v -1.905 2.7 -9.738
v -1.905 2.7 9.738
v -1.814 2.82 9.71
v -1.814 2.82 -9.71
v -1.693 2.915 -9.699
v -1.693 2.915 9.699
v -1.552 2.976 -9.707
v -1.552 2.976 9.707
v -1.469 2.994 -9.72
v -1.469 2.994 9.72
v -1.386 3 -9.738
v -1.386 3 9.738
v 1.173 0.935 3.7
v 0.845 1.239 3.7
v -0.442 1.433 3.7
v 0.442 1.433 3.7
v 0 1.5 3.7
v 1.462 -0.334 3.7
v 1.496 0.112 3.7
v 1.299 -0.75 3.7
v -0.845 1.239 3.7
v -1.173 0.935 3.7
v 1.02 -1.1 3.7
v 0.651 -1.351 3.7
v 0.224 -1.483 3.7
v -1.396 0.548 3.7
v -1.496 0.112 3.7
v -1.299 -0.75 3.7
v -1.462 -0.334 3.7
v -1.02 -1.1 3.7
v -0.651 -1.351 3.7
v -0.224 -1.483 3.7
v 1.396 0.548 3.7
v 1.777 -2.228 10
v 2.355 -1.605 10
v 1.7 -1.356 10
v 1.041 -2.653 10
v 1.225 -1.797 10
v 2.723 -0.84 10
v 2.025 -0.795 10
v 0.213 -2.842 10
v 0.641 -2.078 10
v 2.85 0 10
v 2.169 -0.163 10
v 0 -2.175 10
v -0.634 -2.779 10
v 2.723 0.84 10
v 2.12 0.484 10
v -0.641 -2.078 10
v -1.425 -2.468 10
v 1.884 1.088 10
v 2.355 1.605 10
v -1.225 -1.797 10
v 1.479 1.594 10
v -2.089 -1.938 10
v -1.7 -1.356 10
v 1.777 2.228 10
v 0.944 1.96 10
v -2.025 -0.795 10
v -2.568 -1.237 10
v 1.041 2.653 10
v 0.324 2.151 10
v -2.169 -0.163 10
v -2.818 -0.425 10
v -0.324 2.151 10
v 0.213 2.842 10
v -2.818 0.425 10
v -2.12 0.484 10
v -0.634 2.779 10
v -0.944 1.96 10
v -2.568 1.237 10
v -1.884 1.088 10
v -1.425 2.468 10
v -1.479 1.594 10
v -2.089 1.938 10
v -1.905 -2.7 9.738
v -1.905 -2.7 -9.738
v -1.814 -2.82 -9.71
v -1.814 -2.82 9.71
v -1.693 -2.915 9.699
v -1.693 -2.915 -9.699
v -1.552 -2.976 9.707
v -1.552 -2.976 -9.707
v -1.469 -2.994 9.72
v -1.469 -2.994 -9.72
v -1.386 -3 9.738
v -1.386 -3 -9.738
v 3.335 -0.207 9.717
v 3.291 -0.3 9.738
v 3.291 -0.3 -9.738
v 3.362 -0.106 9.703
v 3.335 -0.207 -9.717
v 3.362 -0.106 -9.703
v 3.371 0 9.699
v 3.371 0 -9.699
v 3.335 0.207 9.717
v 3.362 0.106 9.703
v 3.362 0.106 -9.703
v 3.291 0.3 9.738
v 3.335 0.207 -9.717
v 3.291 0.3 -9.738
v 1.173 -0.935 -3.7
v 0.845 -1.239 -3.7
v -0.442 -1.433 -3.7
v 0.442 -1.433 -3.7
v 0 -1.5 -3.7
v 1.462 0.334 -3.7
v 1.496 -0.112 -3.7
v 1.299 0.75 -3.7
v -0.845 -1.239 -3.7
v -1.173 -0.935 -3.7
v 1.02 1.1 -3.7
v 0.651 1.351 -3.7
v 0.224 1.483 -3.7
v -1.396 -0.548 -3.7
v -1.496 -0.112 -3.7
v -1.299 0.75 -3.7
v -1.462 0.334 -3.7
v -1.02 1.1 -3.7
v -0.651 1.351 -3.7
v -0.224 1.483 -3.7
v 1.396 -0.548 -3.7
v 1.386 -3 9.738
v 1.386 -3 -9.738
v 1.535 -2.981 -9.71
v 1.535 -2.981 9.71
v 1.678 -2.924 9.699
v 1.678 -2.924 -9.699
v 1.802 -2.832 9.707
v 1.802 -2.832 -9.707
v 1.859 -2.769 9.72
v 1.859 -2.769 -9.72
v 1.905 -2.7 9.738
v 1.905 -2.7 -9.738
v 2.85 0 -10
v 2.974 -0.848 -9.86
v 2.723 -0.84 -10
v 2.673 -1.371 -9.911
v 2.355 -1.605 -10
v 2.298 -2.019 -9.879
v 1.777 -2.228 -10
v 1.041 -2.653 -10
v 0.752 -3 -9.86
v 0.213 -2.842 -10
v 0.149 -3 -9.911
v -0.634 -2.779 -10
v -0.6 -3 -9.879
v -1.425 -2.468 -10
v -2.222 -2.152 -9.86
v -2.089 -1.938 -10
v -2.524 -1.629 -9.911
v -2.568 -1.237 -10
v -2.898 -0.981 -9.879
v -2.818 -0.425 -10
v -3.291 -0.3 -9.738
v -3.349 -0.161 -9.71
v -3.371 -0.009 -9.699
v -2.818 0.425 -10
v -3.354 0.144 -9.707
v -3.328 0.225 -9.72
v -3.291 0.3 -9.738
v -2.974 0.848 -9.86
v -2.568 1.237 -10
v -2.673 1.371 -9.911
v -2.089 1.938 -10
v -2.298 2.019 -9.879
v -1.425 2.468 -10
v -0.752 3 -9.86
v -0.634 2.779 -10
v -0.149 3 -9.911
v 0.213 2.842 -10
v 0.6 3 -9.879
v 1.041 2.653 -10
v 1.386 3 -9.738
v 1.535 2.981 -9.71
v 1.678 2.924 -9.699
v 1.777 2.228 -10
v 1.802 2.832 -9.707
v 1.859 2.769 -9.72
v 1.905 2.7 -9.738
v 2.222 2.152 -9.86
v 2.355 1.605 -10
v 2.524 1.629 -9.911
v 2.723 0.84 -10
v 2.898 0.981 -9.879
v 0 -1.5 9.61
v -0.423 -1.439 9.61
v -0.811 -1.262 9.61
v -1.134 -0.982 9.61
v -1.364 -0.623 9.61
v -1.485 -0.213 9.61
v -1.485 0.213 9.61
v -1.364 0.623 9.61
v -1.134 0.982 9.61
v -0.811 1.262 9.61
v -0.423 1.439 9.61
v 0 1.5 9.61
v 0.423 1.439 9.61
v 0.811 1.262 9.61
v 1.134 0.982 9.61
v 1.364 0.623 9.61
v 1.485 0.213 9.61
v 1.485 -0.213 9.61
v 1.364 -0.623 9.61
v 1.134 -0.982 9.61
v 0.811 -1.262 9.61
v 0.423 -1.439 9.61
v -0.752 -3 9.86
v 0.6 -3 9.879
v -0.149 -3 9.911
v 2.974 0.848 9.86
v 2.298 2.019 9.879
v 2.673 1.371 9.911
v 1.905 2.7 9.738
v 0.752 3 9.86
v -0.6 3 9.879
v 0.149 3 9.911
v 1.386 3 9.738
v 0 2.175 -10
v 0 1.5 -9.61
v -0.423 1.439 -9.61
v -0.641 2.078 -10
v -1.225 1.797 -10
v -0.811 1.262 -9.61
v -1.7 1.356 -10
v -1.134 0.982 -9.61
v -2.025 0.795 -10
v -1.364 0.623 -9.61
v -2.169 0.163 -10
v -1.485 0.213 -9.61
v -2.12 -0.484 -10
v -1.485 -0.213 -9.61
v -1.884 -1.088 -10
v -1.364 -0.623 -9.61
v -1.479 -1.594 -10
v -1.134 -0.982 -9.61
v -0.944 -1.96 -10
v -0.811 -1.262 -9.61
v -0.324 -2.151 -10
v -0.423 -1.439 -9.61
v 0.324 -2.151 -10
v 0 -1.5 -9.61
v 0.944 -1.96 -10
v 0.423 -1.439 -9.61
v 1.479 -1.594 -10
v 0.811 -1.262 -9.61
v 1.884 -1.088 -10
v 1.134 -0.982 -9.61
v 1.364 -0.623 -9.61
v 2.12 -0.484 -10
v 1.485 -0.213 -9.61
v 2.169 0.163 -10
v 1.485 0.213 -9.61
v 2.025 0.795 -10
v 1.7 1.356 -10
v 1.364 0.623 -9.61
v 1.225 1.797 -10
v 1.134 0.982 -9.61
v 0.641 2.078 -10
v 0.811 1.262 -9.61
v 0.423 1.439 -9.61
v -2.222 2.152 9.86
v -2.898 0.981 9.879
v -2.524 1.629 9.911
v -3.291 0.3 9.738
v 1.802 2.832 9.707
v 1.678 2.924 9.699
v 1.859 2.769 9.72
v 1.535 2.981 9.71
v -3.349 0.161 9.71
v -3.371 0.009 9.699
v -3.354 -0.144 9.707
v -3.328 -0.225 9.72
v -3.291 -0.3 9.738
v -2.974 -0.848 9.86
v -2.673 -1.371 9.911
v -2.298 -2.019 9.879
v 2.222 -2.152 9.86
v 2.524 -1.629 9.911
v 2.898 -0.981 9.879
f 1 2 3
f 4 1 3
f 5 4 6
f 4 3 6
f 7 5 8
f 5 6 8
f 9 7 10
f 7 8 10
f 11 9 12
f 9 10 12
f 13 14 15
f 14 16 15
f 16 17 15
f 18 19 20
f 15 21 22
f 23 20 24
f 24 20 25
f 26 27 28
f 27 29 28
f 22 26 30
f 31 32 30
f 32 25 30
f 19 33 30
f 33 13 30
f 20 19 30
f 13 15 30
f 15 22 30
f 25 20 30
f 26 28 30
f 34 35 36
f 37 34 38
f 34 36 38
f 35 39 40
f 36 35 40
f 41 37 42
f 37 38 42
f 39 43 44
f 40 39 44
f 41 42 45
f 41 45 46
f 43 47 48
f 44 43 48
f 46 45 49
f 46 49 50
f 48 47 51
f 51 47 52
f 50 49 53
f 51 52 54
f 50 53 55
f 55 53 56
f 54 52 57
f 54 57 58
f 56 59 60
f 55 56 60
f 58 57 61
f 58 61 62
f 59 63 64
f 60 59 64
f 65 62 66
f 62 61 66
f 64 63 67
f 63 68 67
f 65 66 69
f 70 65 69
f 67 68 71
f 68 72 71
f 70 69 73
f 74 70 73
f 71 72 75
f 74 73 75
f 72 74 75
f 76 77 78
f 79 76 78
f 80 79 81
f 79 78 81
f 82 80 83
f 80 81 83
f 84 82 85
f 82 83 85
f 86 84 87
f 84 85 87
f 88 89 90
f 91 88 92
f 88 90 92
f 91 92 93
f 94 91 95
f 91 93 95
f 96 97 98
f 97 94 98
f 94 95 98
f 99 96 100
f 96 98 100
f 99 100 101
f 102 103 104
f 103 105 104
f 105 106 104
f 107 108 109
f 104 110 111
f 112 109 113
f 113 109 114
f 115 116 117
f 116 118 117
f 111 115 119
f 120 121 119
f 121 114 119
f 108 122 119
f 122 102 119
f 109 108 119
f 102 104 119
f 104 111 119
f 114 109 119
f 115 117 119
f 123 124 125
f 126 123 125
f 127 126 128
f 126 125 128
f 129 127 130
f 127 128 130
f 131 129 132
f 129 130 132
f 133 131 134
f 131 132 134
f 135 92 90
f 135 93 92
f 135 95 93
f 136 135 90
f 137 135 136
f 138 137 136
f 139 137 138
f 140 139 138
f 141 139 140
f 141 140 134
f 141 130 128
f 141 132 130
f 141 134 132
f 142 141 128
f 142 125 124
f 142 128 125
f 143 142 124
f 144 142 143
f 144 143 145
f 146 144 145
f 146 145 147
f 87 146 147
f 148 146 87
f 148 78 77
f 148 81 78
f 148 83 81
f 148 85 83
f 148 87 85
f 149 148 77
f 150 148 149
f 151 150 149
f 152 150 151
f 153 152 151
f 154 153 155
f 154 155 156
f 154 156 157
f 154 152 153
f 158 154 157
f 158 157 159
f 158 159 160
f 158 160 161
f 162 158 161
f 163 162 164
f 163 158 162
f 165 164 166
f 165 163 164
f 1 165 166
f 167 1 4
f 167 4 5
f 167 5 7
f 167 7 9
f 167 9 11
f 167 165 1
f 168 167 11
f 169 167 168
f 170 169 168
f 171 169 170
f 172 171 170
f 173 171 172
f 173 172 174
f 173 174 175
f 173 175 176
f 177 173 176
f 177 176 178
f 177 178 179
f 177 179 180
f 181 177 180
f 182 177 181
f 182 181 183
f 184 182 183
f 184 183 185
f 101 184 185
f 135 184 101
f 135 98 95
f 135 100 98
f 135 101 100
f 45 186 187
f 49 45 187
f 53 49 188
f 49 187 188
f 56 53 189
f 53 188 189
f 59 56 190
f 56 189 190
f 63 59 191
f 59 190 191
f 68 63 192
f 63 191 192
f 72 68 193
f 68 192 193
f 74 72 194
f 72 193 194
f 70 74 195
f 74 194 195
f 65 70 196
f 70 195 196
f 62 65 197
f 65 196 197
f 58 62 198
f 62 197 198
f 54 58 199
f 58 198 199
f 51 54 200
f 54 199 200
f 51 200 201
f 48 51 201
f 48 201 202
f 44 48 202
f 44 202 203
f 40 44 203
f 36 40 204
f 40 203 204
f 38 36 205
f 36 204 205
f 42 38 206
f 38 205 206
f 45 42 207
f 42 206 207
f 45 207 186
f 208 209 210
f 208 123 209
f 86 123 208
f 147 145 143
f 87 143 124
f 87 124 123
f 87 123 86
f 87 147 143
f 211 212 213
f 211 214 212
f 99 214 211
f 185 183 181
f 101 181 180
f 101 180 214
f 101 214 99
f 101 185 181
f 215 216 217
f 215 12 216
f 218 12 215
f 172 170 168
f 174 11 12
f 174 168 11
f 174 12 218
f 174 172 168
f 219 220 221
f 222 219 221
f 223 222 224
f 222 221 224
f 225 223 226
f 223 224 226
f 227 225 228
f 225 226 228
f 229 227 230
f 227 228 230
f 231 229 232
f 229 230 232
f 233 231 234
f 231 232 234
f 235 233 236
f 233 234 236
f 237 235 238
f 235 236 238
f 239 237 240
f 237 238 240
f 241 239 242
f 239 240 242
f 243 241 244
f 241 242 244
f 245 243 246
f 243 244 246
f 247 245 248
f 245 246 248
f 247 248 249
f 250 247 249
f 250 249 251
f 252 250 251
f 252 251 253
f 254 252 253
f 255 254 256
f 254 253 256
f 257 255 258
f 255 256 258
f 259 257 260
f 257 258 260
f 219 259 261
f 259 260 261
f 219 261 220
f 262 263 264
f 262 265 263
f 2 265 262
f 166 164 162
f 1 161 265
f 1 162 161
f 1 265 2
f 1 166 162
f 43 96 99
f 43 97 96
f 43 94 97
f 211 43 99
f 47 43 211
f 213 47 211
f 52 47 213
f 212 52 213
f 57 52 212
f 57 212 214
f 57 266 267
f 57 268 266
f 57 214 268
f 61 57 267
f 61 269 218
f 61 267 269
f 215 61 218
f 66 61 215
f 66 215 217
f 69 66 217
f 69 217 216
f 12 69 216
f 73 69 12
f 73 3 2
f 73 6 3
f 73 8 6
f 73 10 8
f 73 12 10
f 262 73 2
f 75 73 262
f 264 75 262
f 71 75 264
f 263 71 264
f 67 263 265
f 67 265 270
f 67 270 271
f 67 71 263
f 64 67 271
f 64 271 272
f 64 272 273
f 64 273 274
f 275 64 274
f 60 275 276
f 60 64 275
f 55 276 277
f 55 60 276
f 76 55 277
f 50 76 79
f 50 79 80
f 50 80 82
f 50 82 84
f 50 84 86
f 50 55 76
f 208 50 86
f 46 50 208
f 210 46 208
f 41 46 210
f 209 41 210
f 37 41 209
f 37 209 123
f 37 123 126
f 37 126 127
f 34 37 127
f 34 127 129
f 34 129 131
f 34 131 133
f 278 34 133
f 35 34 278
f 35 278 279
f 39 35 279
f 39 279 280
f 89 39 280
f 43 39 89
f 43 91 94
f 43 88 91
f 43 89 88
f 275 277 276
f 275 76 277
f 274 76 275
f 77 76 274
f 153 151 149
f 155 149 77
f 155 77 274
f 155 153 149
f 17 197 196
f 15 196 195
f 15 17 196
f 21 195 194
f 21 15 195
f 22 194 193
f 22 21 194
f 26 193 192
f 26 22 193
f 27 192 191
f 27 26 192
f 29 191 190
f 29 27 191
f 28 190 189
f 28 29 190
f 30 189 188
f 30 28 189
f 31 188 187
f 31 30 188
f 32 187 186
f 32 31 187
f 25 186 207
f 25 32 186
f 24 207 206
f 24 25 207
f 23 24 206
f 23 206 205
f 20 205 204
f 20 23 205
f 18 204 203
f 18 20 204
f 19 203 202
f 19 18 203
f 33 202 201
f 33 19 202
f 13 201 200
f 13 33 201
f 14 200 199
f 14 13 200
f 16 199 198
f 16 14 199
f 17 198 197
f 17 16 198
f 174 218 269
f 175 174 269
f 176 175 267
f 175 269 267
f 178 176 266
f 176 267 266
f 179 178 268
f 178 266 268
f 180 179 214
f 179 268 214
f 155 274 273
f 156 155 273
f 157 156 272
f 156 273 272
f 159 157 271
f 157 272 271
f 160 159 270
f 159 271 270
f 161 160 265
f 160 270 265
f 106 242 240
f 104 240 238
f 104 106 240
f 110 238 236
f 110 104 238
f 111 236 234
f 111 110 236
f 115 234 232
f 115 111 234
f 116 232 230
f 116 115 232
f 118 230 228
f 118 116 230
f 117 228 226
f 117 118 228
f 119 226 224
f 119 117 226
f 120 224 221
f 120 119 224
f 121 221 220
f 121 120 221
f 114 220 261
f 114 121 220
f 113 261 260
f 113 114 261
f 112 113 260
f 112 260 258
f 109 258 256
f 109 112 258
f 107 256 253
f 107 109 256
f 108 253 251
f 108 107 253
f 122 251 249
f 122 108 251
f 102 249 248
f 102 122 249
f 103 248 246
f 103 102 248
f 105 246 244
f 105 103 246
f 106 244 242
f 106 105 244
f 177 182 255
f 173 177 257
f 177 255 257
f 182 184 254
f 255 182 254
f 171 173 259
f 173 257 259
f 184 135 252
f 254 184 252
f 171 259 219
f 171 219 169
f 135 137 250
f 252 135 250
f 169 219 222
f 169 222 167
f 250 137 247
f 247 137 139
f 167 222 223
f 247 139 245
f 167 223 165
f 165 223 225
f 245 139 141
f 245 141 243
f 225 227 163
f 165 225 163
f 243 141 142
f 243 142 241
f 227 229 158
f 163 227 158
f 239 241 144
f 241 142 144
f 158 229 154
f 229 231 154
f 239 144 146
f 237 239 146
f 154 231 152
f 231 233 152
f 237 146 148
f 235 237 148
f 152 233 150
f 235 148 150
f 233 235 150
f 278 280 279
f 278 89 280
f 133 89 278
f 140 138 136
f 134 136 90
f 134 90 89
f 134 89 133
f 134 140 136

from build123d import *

# Parameters (mm, degrees)
SKETCH4_R           = 2.25
BOSS_EXTRUDE1_DEPTH = 10
SKETCH5_OUTSIDE_W   = 87.87
SKETCH5_OUTSIDE_H   = 86.942
SKETCH5_OUTSIDE_R   = 2.85
CUT_EXTRUDE1_DEPTH  = 21.518284529
CUT_EXTRUDE1_DRAFT  = -60
SKETCH6_OUTSIDE_W   = 87.87
SKETCH6_OUTSIDE_H   = 86.942
SKETCH6_OUTSIDE_R   = 2.85
CUT_EXTRUDE2_DEPTH  = 21.518284529
CUT_EXTRUDE2_DRAFT  = -60
FILLET1_R           = 0.6
BOSS_EXTRUDE2_START = -10
SKETCH7_R           = 2.175
BOSS_EXTRUDE2_DEPTH = 6.3
SKETCH8_W           = 6.3
SKETCH8_H           = 1.5
CIRPATTERN1_COUNT   = 2


with BuildPart() as part:
    # Sketch3 → Revolve1 (revolve)
    with BuildSketch(Plane(origin=(0, 0, 0), x_dir=(0, 0, -1), z_dir=(1, 0, 0))):
        Polygon((-9.610288568, 1.5), (-3.7, 1.5), (-3.7, 0), (3.7, 0), (3.7, 1.5), (9.610288568, 1.5), (10, 2.175), (10, 3), (0, 3), (-10, 3), (-10, 2.175), align=None)
        Polygon((-9.610288568, 1.5), (-3.7, 1.5), (-3.7, 0), (3.7, 0), (3.7, 1.5), (9.610288568, 1.5), (10, 2.175), (10, 3), (0, 3), (-10, 3), (-10, 2.175), align=None)
    revolve(axis=Axis((0, 0, 3.7), (0, 0, 1)))

    # Sketch4 → Boss-Extrude1 (add, symmetric)
    with BuildSketch(Plane.XY):
        Polygon((-1.732050808, 3), (-3.464101615, 0), (-1.732050808, -3), (1.732050808, -3), (3.464101615, 0), (1.732050808, 3), align=None)
        Circle(SKETCH4_R, mode=Mode.SUBTRACT)
    extrude(amount=BOSS_EXTRUDE1_DEPTH, both=True)


with BuildPart() as cut_extrude1_tool:
    # Sketch5 outside → Cut-Extrude1 (with draft: the straight prism first)
    with BuildSketch(Plane.XY.offset(10)):
        Rectangle(SKETCH5_OUTSIDE_W, SKETCH5_OUTSIDE_H)
        Circle(SKETCH5_OUTSIDE_R, mode=Mode.SUBTRACT)
    extrude(amount=-CUT_EXTRUDE1_DEPTH)
    # Cut-Extrude1: the draft: its side faces are tilted about the plane it starts from
    cut_extrude1_sides = [cut_extrude1_tool.faces().sort_by_distance(p)[0] for p in [
        (0, -43.471, -0.759142264),
        (43.935, 0, -0.759142264),
        (0, 43.471, -0.759142264),
        (-43.935, 0, -0.759142264),
        (-2.85, 0, -0.759142264),
    ]]
    draft(cut_extrude1_sides, Plane.XY.offset(10), CUT_EXTRUDE1_DRAFT)


with BuildPart() as part_1:
    add(part.part)

    # Cut-Extrude1: cut by cut_extrude1_tool
    add(cut_extrude1_tool.part, mode=Mode.SUBTRACT)


with BuildPart() as cut_extrude2_tool:
    # Sketch6 outside → Cut-Extrude2 (with draft: the straight prism first)
    with BuildSketch(Plane(origin=(0, 0, -10), x_dir=(-1, 0, 0), z_dir=(0, 0, -1))):
        Rectangle(SKETCH6_OUTSIDE_W, SKETCH6_OUTSIDE_H)
        Circle(SKETCH6_OUTSIDE_R, mode=Mode.SUBTRACT)
    extrude(amount=-CUT_EXTRUDE2_DEPTH)
    # Cut-Extrude2: the draft: its side faces are tilted about the plane it starts from
    cut_extrude2_sides = [cut_extrude2_tool.faces().sort_by_distance(p)[0] for p in [
        (0, -43.471, 0.759142264),
        (-43.935, 0, 0.759142264),
        (0, 43.471, 0.759142264),
        (43.935, 0, 0.759142264),
        (2.85, 0, 0.759142264),
    ]]
    draft(cut_extrude2_sides, Plane(origin=(0, 0, -10), x_dir=(-1, 0, 0), z_dir=(0, 0, -1)), CUT_EXTRUDE2_DRAFT)


with BuildPart() as part_2:
    add(part_1.part)

    # Cut-Extrude2: cut by cut_extrude2_tool
    add(cut_extrude2_tool.part, mode=Mode.SUBTRACT)

    # Fillet1
    # the kernel refuses this fillet: 0.6 mm, written as the material it takes off along each edge
    with BuildSketch(Plane(origin=(1.732050808, 3, 10.511473671), x_dir=(-1, 0, 0), z_dir=(0, 0, -1)), Plane(origin=(-1.732050808, 3, 10.511473671), x_dir=(-0.5000000000000006, -0.8660254037844383, 0), z_dir=(0, 0, -1))) as fillet1_piece_1:
        with BuildLine():
            CenterArc((FILLET1_R * 0.57735026919, -FILLET1_R), FILLET1_R, 90, 60)
            Line((-FILLET1_R * 0.288675134595, -FILLET1_R * 0.5), (0, 0))
            Line((0, 0), (FILLET1_R * 0.57735026919, 0))
        make_face()
    extrude(amount=21.022947342, mode=Mode.SUBTRACT)
    with BuildSketch(Plane(origin=(-3.464101615, 0, -10.511473671), x_dir=(0.5000000000000008, -0.8660254037844383, 0), z_dir=(0, 0, 1)), Plane(origin=(-1.732050808, -3, -10.511473671), x_dir=(1, 0, 0), z_dir=(0, 0, 1)), Plane(origin=(1.732050808, -3, -10.511473671), x_dir=(0.5000000000000001, 0.8660254037844386, 0), z_dir=(0, 0, 1)), Plane(origin=(3.464101615, 0, 10.511473671), x_dir=(-0.4999999999999995, -0.8660254037844388, 0), z_dir=(0, 0, -1))) as fillet1_piece_2:
        with BuildLine():
            CenterArc((FILLET1_R * 0.57735026919, FILLET1_R), FILLET1_R, 210, 60)
            Line((-FILLET1_R * 0.288675134595, FILLET1_R * 0.5), (0, 0))
            Line((0, 0), (FILLET1_R * 0.57735026919, 0))
        make_face()
    extrude(amount=21.022947342, mode=Mode.SUBTRACT)

    # Sketch7 → Boss-Extrude2 (add)
    with BuildSketch(Plane(origin=(0, 0, 0), x_dir=(-1, 0, 0), z_dir=(0, 0, -1)).offset(BOSS_EXTRUDE2_START)):
        Circle(SKETCH7_R)
    extrude(amount=BOSS_EXTRUDE2_DEPTH)

    # SurfaceCut1
    split(bisect_by=Plane.XY, keep=Keep.TOP)


with BuildPart() as body_2:
    # Sketch8 → Revolve2 (revolve)
    with BuildSketch(Plane(origin=(0, 0, 0), x_dir=(0, 0, -1), z_dir=(1, 0, 0))):
        with Locations((-6.85, 0.75)):
            Rectangle(SKETCH8_W, SKETCH8_H)
    revolve(axis=Axis((0, 0, 3.7), (0, 0, 1)))


with BuildPart() as part_3:
    add(part_2.part)

    # Combine1: cut body 2
    add(body_2.part, mode=Mode.SUBTRACT)

    # Cut-Extrude3 cone 1 section (through the dimple's axis) → Cut-Extrude3 (revolve, cut)
    with BuildSketch(Plane(origin=(0, 0, 10), x_dir=(0, -1, 0), z_dir=(1, 0, 0))):
        Polygon((0, 0), (2.175, 0), (0, 1.255736835), align=None)
    revolve(axis=Axis((0, 0, 10), (0, 0, -1)), mode=Mode.SUBTRACT)


with BuildPart() as cirpattern1_1:
    # CirPattern1: pattern copy
    add(part_3.part.rotate(Axis((0, 0, 0), (1, 0, 0)), 1 * 360 / CIRPATTERN1_COUNT))


with BuildPart() as part_4:
    add(part_3.part)

    # Combine2: union CirPattern1_1
    add(cirpattern1_1.part)


solid = part_4.part
